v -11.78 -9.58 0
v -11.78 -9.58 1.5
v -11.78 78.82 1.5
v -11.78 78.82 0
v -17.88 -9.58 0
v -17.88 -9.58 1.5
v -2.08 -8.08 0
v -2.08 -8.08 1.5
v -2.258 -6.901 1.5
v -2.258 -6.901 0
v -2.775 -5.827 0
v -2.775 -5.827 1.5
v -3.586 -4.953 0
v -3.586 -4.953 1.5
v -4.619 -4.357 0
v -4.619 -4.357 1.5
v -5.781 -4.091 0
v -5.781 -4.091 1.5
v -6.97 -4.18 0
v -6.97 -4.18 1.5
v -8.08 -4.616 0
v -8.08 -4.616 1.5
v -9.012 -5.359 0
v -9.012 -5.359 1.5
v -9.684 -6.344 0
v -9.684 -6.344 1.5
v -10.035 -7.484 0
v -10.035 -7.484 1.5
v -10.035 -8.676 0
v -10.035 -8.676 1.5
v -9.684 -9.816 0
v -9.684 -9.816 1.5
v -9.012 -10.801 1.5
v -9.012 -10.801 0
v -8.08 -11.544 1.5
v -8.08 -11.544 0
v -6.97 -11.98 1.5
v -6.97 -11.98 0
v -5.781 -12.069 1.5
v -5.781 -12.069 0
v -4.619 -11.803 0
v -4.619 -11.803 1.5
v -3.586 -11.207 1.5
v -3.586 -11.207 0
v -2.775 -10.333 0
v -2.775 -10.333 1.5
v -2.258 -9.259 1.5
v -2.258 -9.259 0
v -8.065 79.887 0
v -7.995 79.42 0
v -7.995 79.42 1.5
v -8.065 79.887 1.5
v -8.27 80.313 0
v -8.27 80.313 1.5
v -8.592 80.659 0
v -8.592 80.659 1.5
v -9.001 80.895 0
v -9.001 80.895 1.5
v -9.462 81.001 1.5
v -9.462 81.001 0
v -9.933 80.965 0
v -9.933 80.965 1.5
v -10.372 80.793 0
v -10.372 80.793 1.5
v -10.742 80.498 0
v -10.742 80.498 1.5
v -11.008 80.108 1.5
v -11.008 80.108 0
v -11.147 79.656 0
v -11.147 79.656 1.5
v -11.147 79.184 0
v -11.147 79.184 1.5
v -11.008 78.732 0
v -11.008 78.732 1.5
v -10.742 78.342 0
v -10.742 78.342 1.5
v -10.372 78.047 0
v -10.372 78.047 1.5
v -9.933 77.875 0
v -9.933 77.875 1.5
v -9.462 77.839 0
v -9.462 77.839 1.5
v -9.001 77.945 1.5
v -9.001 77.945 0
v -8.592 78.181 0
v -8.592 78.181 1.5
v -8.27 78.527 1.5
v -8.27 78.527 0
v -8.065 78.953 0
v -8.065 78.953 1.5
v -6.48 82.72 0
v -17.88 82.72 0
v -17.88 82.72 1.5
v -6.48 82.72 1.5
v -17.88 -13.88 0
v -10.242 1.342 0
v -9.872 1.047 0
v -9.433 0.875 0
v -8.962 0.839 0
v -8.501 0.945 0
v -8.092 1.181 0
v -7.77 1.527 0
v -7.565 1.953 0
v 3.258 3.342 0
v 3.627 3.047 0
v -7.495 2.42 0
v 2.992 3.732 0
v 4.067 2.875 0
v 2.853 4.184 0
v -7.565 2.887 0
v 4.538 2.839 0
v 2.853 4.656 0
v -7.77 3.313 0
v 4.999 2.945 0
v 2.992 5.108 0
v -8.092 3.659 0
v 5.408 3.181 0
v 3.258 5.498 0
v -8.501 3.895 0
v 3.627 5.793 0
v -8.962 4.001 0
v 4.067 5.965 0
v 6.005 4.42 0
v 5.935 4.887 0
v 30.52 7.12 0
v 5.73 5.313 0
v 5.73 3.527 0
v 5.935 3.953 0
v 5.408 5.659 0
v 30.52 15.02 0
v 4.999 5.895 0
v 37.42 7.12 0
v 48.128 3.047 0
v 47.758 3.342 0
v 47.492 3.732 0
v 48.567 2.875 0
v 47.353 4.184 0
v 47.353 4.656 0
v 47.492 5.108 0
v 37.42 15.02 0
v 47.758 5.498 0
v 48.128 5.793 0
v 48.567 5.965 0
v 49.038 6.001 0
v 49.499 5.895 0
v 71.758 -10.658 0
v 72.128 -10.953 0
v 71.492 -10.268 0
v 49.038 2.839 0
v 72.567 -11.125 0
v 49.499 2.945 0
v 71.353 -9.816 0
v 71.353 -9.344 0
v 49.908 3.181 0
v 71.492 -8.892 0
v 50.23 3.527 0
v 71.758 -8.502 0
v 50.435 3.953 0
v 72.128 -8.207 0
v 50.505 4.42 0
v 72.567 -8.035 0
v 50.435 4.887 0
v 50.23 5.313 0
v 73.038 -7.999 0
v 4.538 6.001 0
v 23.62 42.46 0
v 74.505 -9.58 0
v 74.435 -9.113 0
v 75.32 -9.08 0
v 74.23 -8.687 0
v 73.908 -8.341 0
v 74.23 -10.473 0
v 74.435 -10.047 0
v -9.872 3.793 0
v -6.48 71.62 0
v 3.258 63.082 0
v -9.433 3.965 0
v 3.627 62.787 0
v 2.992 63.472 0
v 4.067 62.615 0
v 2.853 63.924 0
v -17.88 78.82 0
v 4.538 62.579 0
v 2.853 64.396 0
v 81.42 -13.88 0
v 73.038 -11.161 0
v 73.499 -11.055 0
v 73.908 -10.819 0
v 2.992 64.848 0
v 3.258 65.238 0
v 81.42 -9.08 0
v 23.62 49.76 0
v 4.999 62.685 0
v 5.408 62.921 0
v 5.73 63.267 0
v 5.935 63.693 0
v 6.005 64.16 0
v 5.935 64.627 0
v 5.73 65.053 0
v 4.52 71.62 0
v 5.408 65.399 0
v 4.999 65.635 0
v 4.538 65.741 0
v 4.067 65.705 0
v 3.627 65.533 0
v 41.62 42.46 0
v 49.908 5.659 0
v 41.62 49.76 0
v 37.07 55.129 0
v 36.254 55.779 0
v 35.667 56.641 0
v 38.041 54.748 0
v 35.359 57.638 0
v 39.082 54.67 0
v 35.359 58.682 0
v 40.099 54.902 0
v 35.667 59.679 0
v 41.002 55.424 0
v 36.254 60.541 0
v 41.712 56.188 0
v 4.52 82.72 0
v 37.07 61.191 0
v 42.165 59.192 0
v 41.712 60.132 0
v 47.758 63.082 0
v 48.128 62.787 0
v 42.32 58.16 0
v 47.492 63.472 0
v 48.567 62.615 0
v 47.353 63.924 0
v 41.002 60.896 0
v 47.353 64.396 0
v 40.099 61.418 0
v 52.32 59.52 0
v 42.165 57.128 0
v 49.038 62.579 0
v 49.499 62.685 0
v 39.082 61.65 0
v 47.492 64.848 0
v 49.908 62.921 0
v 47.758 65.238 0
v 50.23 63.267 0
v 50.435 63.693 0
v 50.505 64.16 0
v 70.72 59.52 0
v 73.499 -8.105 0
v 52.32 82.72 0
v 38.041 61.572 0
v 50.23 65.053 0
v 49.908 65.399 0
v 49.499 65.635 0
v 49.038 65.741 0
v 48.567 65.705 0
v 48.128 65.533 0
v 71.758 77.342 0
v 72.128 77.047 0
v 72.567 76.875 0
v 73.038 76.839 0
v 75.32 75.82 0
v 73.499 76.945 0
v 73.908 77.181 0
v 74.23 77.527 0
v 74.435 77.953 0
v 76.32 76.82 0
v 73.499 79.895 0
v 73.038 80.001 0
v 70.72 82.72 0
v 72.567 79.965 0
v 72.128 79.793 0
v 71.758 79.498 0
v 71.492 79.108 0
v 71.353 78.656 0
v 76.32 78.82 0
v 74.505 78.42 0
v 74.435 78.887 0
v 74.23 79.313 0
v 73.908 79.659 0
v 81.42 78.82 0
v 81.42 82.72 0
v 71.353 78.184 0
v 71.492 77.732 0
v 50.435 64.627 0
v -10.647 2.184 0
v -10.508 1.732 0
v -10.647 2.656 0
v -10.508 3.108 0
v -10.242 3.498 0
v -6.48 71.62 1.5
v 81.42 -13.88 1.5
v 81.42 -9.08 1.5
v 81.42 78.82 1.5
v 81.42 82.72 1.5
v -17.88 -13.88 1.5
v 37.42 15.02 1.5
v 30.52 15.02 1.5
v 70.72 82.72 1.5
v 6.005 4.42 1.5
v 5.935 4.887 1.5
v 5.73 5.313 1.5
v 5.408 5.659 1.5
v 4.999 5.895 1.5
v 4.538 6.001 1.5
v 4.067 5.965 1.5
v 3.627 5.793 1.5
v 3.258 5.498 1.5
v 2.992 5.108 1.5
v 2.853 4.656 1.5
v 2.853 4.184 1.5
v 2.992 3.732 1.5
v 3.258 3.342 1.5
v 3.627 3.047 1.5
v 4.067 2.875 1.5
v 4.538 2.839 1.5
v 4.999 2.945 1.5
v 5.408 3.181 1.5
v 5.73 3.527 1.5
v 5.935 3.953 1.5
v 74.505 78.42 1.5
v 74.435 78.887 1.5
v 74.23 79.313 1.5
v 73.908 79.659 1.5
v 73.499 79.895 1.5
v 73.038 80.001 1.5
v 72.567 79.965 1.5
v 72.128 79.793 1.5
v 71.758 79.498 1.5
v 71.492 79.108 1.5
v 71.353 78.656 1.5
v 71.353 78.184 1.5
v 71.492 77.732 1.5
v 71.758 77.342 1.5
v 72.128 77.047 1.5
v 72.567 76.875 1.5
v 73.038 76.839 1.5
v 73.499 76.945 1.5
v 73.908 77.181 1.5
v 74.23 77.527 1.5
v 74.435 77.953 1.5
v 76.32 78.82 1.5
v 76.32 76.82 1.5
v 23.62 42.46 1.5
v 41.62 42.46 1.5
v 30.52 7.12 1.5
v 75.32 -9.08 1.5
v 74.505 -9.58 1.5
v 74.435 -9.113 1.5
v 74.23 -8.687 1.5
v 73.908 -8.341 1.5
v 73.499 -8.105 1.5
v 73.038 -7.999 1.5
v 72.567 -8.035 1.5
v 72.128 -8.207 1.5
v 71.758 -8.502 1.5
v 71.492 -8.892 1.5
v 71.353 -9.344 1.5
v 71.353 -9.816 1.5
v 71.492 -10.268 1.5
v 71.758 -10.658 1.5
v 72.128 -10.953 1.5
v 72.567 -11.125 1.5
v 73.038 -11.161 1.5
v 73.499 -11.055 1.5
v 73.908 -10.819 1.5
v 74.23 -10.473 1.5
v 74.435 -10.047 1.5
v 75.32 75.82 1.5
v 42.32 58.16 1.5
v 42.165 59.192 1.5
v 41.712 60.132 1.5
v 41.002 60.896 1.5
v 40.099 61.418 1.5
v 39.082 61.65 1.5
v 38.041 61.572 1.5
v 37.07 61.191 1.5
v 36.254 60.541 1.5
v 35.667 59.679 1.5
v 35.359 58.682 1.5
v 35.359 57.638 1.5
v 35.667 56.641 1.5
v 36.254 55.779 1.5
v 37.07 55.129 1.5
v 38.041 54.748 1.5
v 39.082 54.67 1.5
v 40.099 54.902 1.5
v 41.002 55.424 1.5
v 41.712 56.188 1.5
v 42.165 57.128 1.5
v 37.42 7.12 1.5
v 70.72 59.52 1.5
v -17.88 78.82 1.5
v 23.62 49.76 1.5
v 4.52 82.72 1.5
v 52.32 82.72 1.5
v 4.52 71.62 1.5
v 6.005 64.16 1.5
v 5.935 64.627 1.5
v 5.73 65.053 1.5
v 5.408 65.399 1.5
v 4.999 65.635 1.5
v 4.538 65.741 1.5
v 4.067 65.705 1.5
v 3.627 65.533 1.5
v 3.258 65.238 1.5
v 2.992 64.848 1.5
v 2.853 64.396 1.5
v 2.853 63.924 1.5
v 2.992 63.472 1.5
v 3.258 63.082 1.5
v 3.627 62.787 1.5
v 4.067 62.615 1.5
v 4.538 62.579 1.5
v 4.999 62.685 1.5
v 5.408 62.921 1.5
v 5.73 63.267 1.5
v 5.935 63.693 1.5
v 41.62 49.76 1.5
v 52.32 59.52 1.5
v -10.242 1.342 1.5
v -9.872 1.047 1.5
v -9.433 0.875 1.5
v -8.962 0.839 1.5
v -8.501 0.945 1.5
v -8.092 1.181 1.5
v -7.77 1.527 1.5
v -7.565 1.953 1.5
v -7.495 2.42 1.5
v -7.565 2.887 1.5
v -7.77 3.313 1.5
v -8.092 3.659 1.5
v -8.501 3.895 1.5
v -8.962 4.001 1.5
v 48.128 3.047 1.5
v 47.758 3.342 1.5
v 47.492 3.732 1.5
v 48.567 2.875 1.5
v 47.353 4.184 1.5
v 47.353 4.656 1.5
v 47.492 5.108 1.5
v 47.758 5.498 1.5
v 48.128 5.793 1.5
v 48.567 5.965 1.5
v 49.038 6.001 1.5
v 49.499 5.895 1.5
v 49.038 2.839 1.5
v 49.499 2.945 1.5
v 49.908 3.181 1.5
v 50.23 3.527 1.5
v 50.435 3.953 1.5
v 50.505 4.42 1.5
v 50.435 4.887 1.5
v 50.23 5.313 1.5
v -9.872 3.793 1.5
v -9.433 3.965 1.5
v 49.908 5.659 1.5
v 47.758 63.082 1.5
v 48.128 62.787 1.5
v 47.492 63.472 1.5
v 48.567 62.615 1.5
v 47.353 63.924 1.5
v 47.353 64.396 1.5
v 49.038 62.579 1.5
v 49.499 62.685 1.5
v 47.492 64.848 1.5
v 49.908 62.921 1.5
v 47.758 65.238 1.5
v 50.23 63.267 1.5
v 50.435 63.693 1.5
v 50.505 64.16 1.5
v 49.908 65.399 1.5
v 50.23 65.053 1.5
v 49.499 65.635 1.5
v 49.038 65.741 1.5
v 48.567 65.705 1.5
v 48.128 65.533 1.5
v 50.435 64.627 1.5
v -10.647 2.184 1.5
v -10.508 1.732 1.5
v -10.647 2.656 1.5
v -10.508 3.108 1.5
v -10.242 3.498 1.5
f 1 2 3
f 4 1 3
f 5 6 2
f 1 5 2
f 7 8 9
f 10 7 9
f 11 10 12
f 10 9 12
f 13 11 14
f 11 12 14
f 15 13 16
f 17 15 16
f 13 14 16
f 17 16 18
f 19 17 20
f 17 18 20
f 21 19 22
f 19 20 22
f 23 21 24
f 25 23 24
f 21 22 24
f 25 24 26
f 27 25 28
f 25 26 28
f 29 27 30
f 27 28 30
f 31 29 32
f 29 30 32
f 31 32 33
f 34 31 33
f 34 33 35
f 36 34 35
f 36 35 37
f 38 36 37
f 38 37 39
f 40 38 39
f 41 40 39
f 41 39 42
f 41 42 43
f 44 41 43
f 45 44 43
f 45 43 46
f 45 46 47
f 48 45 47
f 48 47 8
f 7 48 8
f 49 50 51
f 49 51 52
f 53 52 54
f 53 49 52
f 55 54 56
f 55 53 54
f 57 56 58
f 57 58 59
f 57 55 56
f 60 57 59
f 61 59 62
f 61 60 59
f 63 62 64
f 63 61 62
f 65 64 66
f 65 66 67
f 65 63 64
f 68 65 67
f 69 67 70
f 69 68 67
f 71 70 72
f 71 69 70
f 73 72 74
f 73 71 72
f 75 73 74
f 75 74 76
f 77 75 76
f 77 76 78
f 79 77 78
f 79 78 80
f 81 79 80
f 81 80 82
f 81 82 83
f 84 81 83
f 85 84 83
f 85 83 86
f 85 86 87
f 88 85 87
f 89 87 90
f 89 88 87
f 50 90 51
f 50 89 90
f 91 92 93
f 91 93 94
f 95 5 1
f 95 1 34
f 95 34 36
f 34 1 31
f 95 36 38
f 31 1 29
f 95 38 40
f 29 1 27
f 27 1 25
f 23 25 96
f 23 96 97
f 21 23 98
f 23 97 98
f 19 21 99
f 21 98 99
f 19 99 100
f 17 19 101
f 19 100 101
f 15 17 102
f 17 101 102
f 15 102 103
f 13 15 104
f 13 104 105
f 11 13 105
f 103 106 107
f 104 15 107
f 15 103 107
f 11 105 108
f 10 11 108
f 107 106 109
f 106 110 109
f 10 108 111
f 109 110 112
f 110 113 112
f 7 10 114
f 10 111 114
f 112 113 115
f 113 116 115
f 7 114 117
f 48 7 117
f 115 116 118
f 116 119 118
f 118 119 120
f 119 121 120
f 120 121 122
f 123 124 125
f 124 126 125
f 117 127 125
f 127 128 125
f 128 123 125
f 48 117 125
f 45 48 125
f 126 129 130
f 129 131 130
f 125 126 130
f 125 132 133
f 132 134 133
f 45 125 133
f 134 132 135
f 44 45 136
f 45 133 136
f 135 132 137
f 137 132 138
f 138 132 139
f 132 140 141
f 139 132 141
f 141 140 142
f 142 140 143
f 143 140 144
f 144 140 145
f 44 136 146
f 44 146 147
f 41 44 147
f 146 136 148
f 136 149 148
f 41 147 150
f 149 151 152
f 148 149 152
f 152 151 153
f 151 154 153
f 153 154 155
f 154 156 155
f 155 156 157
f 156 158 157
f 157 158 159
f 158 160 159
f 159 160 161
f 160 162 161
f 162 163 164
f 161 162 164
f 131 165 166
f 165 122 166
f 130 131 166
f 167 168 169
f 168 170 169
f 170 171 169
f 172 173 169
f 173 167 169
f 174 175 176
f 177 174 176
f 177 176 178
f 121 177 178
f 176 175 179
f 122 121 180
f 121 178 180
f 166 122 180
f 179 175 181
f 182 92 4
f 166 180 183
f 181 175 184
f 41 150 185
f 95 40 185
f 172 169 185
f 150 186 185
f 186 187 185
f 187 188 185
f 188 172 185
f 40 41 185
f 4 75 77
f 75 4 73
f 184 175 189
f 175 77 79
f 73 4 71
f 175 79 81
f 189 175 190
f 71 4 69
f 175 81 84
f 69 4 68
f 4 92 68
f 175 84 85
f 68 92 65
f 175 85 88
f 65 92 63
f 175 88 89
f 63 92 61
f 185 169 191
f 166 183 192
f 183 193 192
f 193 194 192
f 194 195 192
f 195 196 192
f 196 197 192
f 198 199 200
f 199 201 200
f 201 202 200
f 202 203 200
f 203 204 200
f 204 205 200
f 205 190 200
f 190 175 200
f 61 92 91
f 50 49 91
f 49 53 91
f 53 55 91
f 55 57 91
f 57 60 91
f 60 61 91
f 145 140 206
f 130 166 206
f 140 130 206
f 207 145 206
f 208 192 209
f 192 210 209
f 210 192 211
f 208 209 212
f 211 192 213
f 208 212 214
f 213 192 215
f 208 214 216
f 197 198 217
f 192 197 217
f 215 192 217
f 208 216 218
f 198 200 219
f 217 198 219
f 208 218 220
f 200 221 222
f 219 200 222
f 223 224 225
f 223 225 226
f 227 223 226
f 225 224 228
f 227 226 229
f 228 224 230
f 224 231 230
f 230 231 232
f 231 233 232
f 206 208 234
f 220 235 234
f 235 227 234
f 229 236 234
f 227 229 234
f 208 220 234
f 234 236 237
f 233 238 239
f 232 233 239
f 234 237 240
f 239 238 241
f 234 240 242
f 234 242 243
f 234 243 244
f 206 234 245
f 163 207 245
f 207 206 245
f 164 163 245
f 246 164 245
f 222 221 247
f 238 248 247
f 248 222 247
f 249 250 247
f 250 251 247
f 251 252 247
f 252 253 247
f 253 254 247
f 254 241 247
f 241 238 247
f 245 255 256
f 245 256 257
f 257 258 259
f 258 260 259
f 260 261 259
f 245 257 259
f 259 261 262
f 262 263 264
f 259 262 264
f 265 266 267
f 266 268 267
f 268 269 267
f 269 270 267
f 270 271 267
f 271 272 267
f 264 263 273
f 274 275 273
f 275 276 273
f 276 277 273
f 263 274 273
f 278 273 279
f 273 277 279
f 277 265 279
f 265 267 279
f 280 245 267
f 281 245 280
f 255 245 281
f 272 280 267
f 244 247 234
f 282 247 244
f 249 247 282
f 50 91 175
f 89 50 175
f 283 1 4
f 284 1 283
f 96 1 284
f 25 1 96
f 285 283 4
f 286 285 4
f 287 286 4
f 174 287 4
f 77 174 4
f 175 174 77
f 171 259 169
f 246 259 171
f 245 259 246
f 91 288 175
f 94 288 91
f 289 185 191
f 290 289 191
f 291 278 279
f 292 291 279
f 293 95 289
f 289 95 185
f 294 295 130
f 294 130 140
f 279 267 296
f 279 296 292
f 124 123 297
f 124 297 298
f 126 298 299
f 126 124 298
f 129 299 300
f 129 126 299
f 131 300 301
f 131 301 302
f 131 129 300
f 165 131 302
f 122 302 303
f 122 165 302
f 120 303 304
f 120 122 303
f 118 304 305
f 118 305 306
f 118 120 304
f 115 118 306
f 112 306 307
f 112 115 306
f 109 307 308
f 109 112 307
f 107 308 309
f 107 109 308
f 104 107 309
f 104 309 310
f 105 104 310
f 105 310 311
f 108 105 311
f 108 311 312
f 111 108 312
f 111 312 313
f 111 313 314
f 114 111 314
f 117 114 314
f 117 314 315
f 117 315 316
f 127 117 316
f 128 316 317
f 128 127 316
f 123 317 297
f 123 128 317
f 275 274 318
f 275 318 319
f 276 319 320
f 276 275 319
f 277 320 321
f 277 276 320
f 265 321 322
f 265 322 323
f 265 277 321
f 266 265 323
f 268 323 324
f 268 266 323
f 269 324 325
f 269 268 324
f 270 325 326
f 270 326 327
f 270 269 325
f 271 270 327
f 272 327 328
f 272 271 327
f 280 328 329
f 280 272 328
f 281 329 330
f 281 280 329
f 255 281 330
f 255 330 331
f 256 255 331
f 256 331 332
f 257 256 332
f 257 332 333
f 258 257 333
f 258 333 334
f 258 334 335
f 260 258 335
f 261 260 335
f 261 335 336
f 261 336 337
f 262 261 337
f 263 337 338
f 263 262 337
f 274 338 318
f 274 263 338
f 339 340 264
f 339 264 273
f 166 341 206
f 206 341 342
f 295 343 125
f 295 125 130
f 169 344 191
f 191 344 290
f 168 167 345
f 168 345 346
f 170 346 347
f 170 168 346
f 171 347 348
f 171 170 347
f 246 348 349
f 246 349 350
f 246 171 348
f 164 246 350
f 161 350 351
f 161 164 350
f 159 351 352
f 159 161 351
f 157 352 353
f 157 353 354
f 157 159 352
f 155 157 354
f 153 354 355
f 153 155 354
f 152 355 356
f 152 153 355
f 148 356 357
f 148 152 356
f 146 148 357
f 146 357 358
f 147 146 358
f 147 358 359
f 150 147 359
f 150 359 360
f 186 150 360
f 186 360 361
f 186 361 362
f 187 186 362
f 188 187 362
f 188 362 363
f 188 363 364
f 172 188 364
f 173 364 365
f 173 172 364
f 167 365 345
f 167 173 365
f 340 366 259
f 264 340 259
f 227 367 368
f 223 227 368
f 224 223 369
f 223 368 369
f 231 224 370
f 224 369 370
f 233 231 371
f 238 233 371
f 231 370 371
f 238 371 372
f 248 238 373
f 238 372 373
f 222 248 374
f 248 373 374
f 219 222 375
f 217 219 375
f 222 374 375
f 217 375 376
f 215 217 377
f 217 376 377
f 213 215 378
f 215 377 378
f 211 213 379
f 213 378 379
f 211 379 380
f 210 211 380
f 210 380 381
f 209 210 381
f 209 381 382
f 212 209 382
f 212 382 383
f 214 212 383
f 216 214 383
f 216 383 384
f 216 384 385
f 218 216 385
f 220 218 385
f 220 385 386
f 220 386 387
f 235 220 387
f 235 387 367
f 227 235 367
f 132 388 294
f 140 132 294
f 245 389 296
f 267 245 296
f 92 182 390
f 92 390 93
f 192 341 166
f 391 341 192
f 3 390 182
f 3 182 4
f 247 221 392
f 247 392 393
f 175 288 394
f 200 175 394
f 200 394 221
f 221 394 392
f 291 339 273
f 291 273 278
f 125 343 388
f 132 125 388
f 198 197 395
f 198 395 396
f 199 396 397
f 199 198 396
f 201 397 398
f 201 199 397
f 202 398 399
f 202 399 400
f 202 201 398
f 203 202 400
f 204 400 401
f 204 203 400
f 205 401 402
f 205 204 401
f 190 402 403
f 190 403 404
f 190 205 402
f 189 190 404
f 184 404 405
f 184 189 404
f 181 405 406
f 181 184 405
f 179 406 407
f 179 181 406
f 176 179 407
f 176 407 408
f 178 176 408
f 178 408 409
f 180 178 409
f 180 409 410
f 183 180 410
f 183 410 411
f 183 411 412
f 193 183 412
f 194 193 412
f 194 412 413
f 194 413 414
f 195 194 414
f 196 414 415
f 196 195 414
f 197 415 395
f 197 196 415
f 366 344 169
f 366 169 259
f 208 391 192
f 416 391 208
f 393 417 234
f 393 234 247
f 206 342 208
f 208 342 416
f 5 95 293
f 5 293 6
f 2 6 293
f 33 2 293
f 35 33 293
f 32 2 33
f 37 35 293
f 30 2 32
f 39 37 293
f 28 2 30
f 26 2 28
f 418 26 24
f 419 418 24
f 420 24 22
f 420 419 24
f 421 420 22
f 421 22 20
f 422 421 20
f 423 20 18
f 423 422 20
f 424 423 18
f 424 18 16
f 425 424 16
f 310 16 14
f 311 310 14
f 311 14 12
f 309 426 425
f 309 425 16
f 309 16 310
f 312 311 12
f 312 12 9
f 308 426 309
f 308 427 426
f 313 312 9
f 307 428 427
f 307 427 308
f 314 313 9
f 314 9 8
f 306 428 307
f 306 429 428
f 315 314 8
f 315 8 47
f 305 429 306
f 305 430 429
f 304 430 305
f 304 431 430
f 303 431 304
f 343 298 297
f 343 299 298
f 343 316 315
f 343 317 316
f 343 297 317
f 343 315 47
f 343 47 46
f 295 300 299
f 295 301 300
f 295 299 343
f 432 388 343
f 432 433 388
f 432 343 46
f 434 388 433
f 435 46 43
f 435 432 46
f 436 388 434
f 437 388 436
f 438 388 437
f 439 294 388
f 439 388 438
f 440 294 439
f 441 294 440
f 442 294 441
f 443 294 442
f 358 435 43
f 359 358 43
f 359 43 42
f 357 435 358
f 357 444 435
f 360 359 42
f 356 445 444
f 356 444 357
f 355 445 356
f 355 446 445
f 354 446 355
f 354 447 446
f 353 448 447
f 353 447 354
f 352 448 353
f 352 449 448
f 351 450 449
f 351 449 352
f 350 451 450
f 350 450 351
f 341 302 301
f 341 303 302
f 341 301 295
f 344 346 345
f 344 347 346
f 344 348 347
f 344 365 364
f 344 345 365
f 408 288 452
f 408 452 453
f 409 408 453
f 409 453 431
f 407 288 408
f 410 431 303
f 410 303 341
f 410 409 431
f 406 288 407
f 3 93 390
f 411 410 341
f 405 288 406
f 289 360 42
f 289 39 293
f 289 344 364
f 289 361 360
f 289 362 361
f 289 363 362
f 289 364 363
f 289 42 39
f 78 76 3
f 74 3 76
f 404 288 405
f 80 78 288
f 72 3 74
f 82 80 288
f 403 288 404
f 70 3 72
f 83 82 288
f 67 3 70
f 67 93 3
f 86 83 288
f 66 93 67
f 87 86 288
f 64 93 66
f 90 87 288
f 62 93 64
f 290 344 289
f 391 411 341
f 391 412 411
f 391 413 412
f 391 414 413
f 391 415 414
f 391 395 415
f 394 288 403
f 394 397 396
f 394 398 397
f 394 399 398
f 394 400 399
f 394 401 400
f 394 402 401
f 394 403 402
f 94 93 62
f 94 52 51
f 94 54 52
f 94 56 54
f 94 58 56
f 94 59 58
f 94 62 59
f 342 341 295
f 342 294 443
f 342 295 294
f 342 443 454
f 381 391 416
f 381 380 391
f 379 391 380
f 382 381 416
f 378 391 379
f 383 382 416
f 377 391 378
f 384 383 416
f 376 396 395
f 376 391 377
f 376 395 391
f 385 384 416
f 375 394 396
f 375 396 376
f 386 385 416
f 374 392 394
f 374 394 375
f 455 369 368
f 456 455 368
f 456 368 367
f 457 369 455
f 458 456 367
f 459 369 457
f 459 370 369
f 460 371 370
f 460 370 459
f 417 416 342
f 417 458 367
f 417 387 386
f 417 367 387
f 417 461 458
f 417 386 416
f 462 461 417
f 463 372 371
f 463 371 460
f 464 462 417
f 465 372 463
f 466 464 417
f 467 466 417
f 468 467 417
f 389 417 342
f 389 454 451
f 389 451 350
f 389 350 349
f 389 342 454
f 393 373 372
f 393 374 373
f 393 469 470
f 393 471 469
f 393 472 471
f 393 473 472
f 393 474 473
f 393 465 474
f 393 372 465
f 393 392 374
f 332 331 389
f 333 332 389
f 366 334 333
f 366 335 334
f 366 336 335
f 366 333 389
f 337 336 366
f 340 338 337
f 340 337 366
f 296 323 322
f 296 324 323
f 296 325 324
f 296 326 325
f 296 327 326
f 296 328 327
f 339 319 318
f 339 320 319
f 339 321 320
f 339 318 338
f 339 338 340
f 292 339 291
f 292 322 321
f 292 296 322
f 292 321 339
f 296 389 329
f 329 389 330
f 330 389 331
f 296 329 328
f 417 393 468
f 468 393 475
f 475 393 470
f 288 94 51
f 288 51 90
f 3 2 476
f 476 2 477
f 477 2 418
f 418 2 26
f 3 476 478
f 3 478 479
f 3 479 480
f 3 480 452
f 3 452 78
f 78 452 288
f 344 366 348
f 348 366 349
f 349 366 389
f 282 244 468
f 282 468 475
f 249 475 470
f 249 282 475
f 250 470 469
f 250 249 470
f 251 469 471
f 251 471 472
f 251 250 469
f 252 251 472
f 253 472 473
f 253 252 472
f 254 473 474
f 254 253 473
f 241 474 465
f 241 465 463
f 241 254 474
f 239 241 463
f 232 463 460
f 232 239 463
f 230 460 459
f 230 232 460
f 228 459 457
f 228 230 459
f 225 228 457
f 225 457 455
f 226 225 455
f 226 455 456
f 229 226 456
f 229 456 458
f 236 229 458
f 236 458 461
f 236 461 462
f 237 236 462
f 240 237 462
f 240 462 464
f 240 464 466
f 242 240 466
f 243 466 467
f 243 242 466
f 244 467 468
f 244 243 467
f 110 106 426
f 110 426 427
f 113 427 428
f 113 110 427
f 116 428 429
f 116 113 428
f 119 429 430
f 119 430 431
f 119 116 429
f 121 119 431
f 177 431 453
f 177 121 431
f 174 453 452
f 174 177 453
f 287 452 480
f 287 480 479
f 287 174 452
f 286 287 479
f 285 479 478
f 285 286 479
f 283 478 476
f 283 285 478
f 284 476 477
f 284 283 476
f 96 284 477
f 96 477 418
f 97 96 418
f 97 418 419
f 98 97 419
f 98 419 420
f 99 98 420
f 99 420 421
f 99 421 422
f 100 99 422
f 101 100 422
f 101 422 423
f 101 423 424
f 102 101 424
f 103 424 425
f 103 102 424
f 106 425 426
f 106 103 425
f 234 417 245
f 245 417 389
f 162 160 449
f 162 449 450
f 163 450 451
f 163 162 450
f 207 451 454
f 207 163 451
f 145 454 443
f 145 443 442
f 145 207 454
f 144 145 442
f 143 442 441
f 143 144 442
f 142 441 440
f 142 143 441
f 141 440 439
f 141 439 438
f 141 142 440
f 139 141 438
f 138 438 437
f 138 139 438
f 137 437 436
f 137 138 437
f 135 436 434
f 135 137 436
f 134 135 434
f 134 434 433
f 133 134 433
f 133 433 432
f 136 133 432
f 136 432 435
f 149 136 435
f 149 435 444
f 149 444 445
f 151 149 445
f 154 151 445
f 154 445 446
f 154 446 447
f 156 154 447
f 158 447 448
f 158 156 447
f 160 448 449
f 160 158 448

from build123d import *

# Parameters (mm, degrees)
SKETCH_1_W          = 99.3
SKETCH_1_H          = 96.6
SKETCH_1_R          = 1.585
EXTRUDE_1_DEPTH     = 1.5
SKETCH_2_R          = 3.5
SKETCH_2_R_2        = 4
SKETCH_2_W          = 18.4
SKETCH_2_H          = 23.2
SKETCH_2_W_2        = 18
SKETCH_2_H_2        = 7.3
SKETCH_2_W_3        = 6.1
SKETCH_2_H_3        = 88.4
SKETCH_2_H_4        = 87.9
SKETCH_2_W_4        = 6.9
SKETCH_2_H_5        = 7.9
SKETCH_2_W_5        = 11
SKETCH_2_H_6        = 11.1
CUT_EXTRUDE_1_DEPTH = 117.077839401
SKETCH_3_W          = 1
SKETCH_3_H          = 2
EXTRUDE_2_DEPTH     = 1.5
CHAMFER_1_SIZE      = 1


with BuildPart() as part:
    # 草图1 → 凸台-拉伸1 (new body)
    with BuildSketch(Plane.XY):
        with Locations((31.77, 34.42)):
            Rectangle(SKETCH_1_W, SKETCH_1_H)
        with Locations((48.92, 64.16)):
            Circle(SKETCH_1_R, mode=Mode.SUBTRACT)
        with Locations((4.42, 64.16)):
            Circle(SKETCH_1_R, mode=Mode.SUBTRACT)
        with Locations((4.42, 4.42)):
            Circle(SKETCH_1_R, mode=Mode.SUBTRACT)
        with Locations((48.92, 4.42)):
            Circle(SKETCH_1_R, mode=Mode.SUBTRACT)
        with Locations((-9.08, 2.42)):
            Circle(SKETCH_1_R, mode=Mode.SUBTRACT)
        with Locations((72.92, -9.58)):
            Circle(SKETCH_1_R, mode=Mode.SUBTRACT)
        with Locations((72.92, 78.42)):
            Circle(SKETCH_1_R, mode=Mode.SUBTRACT)
        with Locations((-9.58, 79.42)):
            Circle(SKETCH_1_R, mode=Mode.SUBTRACT)
    extrude(amount=EXTRUDE_1_DEPTH)

    # 草图2 → 切除-拉伸1 (cut, through all)
    with BuildSketch(Plane.XY.offset(1.5)):
        with Locations((38.82, 58.16)):
            Circle(SKETCH_2_R)
        with Locations((-6.08, -8.08)):
            Circle(SKETCH_2_R_2)
        with Locations((61.52, 71.12)):
            Rectangle(SKETCH_2_W, SKETCH_2_H)
        with Locations((32.62, 46.11)):
            Rectangle(SKETCH_2_W_2, SKETCH_2_H_2)
        with Locations((-14.83, 34.62)):
            Rectangle(SKETCH_2_W_3, SKETCH_2_H_3)
        with Locations((78.37, 34.87)):
            Rectangle(SKETCH_2_W_3, SKETCH_2_H_4)
        with Locations((33.97, 11.07)):
            Rectangle(SKETCH_2_W_4, SKETCH_2_H_5)
        with Locations((-0.98, 77.17)):
            Rectangle(SKETCH_2_W_5, SKETCH_2_H_6)
    extrude(amount=-CUT_EXTRUDE_1_DEPTH, mode=Mode.SUBTRACT)

    # 草图3 → 凸台-拉伸2 (add)
    with BuildSketch(Plane.XY.offset(1.5)):
        with Locations((75.82, 77.82)):
            Rectangle(SKETCH_3_W, SKETCH_3_H)
    extrude(amount=-EXTRUDE_2_DEPTH)

    # 倒角1
    chamfer_1_edges = [part.edges().sort_by_distance(p)[0] for p in [
        (75.32, 76.82, 0.75),
    ]]
    chamfer(chamfer_1_edges, length=CHAMFER_1_SIZE - 0.0001)  # a hair under: the kernel refuses the full size


solid = part.part
